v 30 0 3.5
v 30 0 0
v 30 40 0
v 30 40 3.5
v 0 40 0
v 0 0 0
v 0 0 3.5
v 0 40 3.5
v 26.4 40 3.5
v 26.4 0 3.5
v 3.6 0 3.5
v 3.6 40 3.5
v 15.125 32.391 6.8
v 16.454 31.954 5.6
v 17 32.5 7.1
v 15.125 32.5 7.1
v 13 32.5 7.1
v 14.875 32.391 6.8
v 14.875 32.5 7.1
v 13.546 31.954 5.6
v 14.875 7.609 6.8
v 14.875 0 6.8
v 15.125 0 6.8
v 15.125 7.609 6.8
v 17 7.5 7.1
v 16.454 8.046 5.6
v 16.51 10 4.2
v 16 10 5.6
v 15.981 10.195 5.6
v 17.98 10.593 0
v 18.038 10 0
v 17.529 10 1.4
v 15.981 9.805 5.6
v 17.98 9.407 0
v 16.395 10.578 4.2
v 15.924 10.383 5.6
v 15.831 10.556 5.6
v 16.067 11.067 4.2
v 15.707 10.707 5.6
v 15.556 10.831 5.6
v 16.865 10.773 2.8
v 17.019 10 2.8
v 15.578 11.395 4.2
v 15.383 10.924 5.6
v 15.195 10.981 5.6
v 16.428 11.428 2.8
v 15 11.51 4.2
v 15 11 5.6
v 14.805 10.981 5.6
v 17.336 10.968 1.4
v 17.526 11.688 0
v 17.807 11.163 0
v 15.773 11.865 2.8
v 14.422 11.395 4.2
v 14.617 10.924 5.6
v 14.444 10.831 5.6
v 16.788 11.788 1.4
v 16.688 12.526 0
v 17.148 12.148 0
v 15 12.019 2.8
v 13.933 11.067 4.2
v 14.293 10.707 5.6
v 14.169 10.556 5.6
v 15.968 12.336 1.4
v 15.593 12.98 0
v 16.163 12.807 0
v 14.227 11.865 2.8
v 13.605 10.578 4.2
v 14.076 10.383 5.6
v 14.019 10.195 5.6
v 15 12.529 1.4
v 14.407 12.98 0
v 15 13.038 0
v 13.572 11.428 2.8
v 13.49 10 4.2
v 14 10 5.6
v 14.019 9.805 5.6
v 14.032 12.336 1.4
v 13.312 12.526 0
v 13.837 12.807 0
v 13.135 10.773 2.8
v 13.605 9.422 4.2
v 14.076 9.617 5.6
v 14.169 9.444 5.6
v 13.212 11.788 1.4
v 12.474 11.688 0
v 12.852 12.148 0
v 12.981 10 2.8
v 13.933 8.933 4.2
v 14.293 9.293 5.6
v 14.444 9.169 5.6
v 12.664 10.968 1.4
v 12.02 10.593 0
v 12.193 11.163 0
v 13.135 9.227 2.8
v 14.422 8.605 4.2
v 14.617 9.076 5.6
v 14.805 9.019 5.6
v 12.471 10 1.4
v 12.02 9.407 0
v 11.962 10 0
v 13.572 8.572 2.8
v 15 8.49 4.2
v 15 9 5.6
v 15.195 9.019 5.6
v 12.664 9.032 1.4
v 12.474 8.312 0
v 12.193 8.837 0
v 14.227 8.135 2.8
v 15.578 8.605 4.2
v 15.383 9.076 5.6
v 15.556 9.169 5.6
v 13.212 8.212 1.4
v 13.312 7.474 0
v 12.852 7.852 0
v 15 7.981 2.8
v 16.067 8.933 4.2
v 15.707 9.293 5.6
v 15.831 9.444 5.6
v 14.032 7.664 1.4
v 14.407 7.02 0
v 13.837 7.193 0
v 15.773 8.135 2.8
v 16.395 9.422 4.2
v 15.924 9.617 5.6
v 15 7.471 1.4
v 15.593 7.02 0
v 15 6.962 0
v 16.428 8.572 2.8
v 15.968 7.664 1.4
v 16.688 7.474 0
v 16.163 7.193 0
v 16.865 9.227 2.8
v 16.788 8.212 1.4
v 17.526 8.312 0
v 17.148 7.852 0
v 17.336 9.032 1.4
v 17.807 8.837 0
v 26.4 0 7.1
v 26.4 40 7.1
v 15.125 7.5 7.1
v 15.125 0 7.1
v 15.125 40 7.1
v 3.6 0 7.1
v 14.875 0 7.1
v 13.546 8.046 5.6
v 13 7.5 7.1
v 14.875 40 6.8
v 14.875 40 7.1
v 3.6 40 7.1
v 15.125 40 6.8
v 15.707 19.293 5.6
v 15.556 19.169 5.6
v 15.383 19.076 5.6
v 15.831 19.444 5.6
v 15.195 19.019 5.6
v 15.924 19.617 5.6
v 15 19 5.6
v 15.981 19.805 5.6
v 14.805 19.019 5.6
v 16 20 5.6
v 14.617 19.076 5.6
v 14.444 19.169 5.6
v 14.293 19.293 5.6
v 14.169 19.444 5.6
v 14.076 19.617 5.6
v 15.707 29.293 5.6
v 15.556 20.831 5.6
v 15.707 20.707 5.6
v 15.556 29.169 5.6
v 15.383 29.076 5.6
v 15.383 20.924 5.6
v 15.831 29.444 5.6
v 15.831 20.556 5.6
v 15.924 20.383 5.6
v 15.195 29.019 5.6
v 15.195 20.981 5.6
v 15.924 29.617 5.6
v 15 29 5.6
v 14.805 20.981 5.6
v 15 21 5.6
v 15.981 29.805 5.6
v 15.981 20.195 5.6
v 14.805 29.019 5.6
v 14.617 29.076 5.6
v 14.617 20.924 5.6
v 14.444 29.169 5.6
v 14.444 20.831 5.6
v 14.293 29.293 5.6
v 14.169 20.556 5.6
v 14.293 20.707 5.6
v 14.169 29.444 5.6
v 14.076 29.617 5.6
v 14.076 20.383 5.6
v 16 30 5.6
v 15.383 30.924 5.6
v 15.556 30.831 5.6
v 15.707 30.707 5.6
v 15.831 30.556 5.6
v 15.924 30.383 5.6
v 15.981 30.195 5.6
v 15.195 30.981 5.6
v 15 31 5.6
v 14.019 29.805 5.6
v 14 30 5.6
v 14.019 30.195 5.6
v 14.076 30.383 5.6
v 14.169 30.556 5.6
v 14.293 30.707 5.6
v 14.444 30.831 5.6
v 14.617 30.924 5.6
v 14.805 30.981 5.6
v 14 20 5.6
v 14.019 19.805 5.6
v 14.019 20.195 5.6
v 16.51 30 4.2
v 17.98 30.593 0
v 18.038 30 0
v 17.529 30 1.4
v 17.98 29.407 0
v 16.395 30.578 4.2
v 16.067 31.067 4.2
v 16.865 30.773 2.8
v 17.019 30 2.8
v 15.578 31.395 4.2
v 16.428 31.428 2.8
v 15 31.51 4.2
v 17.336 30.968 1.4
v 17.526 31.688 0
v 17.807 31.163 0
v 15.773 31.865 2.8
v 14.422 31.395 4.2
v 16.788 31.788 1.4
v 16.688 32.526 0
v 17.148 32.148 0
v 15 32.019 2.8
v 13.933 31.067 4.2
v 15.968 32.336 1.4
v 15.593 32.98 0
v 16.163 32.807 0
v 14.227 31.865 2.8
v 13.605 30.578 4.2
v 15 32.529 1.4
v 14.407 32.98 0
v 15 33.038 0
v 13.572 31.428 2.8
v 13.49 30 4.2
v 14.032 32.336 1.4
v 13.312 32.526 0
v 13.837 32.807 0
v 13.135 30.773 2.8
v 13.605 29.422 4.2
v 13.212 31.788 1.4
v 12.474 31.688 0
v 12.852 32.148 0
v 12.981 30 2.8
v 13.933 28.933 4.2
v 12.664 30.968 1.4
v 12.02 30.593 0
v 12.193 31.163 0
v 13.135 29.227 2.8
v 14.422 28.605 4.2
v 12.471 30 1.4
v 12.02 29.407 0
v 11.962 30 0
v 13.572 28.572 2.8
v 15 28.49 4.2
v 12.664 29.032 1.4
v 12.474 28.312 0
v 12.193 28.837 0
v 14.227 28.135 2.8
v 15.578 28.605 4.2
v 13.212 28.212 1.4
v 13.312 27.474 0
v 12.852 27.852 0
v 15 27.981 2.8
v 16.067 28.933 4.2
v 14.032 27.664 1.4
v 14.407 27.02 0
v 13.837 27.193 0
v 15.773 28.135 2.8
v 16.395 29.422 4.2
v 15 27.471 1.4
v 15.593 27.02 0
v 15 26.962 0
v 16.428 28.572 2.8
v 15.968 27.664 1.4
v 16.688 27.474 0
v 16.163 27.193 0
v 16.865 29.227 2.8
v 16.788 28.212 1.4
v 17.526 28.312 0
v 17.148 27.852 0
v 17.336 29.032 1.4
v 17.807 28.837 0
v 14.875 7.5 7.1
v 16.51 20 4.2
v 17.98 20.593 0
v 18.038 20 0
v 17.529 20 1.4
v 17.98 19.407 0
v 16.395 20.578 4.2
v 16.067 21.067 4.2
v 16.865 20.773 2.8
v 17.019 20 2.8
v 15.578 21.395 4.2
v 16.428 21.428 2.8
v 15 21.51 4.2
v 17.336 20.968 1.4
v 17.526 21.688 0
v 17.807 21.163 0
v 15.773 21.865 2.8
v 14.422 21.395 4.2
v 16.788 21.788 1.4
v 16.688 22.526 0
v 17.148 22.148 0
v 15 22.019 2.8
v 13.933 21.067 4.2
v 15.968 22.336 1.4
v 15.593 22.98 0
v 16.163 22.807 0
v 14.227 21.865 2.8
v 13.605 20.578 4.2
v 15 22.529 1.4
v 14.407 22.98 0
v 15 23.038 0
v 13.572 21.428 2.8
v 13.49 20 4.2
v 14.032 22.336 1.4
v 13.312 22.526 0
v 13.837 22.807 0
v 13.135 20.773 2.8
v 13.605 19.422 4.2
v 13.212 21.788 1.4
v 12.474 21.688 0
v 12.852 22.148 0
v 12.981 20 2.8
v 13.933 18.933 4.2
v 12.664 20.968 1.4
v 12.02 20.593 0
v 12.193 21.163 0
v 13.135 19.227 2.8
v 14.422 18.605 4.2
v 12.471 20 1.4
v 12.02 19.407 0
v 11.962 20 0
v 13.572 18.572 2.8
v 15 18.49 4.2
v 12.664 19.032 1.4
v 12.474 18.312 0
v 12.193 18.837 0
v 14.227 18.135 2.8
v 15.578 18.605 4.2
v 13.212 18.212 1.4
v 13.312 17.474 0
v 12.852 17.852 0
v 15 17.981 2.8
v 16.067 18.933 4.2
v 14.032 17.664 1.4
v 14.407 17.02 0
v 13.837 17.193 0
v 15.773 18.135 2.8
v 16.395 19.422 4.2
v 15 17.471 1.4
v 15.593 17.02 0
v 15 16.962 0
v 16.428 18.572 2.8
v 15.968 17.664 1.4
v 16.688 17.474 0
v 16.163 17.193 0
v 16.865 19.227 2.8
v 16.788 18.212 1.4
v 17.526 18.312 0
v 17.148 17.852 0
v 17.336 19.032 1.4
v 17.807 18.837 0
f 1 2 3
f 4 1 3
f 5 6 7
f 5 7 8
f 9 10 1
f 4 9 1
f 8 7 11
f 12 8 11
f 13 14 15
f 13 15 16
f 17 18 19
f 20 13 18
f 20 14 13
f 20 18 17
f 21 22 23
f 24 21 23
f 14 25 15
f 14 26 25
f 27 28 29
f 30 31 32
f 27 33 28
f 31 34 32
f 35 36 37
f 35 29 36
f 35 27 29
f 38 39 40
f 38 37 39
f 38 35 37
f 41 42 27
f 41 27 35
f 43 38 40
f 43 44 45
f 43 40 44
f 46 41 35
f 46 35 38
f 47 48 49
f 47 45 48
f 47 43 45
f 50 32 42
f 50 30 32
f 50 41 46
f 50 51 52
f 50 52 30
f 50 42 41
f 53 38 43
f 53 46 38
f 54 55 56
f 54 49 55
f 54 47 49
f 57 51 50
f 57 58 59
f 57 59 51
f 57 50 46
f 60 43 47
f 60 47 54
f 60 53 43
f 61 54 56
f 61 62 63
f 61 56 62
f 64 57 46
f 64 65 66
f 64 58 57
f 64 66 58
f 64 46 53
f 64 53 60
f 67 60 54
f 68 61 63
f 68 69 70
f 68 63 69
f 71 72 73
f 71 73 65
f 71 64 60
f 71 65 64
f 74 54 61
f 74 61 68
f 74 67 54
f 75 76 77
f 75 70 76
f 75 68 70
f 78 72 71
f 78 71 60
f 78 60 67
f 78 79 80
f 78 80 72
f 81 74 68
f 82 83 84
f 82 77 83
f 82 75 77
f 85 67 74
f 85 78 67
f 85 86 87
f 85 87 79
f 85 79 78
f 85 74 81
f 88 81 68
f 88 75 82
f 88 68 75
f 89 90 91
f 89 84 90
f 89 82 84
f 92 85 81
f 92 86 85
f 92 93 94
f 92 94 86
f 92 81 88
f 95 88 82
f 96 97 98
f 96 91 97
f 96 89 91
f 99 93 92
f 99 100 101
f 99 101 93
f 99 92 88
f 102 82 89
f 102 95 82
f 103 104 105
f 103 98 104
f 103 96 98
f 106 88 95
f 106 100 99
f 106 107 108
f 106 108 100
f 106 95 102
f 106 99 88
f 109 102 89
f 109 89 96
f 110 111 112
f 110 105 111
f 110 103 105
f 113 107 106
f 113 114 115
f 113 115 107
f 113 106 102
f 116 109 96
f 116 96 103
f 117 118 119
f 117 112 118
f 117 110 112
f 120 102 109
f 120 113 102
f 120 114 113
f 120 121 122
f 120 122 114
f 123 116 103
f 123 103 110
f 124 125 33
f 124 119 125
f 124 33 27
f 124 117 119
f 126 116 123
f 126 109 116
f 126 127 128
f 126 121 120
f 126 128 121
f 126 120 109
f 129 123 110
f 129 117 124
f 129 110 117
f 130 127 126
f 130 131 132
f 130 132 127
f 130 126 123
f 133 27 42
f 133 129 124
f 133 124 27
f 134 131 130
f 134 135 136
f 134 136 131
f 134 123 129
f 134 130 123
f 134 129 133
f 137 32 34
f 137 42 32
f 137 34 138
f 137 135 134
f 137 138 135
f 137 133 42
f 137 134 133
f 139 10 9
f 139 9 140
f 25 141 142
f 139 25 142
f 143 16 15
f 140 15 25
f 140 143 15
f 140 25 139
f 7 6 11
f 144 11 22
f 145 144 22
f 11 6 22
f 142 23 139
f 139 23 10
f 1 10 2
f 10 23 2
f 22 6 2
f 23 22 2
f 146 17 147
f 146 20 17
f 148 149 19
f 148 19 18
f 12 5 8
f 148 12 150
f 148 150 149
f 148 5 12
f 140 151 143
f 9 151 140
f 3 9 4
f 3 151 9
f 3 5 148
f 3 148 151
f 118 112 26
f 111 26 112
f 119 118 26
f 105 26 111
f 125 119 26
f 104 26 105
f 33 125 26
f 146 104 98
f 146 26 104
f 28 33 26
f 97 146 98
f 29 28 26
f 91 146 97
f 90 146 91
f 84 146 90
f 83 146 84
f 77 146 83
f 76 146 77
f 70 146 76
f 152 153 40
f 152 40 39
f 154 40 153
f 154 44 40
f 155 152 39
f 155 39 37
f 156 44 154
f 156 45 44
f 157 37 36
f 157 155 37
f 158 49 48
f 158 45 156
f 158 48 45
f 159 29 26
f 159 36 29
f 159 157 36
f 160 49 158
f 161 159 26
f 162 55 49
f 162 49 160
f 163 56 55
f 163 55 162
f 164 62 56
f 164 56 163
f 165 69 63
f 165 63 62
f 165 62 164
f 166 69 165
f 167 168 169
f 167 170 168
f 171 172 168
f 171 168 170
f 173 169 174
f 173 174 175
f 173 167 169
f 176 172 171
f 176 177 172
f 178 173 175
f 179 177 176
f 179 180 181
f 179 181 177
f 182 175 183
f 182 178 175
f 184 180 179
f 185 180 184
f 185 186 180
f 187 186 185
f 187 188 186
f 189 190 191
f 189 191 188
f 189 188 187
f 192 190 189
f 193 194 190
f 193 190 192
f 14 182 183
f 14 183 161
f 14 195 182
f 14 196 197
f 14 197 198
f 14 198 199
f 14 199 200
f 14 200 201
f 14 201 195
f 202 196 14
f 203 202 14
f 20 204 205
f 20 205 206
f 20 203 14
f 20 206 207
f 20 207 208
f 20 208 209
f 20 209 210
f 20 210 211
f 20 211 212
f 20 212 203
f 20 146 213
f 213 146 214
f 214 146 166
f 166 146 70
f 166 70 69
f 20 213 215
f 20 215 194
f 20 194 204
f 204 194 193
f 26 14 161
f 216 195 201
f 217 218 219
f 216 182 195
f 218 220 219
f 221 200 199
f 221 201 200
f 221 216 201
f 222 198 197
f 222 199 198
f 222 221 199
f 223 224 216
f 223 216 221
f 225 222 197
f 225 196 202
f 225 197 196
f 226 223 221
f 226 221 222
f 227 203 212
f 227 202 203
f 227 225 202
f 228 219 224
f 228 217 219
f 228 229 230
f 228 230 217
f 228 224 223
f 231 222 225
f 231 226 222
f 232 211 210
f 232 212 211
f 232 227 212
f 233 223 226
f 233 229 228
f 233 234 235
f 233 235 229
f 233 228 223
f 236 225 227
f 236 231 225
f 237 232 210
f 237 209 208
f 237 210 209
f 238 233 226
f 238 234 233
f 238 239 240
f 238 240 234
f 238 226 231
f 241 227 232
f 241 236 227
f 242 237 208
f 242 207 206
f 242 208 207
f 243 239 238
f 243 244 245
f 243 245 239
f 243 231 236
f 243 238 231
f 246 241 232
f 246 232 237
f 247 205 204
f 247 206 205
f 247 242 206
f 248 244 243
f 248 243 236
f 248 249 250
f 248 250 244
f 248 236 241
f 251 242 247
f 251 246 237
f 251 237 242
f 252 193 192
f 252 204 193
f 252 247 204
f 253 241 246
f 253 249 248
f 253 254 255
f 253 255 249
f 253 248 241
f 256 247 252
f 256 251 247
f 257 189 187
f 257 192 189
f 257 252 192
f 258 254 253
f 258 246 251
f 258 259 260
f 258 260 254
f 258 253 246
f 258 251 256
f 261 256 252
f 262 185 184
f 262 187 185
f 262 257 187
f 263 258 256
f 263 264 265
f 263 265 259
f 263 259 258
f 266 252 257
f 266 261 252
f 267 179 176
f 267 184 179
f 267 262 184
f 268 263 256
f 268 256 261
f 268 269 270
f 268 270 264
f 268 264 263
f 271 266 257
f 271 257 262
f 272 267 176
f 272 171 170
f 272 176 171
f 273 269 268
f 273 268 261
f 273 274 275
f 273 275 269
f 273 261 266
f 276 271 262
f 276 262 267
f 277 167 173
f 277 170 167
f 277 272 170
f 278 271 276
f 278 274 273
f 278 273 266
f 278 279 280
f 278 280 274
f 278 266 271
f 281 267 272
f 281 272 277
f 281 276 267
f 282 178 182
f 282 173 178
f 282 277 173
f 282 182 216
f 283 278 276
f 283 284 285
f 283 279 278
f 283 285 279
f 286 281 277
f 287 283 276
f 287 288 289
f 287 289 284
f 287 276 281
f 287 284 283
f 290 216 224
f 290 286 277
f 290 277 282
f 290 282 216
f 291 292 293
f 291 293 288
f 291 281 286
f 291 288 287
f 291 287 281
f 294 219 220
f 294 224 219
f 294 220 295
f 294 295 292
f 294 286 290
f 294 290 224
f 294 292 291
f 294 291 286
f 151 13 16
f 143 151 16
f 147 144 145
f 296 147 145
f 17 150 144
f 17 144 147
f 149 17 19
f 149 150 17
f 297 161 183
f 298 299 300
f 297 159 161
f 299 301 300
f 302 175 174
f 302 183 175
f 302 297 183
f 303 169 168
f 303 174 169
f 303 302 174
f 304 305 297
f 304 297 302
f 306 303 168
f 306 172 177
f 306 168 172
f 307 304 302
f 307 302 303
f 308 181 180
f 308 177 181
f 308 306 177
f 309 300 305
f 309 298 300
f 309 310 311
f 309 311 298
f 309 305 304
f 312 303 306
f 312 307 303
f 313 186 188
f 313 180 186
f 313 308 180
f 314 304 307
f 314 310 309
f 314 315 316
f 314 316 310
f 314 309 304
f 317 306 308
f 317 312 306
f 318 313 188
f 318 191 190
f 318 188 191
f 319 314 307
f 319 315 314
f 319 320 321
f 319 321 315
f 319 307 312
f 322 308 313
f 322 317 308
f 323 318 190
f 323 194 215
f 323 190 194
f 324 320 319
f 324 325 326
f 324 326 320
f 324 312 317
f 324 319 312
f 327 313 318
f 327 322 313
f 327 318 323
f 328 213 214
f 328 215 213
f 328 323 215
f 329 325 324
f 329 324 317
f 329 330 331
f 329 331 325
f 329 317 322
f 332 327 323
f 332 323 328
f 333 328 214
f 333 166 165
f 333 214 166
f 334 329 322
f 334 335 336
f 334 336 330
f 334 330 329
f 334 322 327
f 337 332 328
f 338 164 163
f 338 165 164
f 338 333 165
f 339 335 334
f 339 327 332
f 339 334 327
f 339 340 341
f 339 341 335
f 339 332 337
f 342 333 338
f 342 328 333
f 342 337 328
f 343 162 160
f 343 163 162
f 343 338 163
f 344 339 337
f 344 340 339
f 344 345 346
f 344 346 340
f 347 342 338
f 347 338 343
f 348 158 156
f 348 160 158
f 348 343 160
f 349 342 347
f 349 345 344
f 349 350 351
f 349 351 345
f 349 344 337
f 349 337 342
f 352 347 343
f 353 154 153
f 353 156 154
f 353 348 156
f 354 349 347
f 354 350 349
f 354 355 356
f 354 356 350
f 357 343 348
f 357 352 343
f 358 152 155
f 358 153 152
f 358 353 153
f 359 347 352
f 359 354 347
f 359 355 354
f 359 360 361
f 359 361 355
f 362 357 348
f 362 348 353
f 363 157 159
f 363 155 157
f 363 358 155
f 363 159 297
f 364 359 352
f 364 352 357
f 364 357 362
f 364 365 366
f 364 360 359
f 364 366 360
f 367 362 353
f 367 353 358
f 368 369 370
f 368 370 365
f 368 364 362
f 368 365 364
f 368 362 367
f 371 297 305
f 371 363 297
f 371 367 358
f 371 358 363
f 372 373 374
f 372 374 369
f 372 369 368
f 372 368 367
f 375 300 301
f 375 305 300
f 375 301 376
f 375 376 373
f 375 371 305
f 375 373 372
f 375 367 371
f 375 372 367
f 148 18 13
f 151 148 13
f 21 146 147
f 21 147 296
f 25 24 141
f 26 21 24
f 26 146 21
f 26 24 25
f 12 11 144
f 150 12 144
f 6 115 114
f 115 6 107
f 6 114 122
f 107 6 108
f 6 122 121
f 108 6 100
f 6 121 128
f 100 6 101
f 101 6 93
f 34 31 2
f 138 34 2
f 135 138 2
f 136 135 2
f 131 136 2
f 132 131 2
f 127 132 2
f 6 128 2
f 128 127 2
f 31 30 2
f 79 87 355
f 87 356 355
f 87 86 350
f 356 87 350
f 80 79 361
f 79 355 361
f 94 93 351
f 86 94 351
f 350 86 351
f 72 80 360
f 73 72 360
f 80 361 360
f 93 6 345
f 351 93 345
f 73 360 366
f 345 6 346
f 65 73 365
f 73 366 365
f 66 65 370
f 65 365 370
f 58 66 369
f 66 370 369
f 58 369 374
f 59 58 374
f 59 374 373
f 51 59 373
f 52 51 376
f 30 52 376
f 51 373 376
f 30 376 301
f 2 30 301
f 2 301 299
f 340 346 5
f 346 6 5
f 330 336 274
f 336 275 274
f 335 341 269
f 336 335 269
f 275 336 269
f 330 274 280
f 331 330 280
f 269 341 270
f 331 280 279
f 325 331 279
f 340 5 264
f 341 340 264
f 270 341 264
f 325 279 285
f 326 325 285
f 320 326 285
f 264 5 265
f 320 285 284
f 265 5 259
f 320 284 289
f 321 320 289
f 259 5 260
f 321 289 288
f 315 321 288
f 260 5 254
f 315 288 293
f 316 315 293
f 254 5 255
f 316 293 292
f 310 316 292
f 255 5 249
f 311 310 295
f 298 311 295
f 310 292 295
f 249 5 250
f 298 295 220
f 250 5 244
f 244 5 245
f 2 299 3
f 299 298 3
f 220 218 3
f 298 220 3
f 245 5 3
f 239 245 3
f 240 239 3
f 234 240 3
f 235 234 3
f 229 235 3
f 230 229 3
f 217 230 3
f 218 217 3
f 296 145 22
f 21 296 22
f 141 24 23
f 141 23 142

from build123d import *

# Parameters (mm, degrees)
F0_W     = 30
F0_H     = 40
F1_DEPTH = 7.1
F2_W     = 4
F2_H     = 25
F3_DEPTH = 1.5
F3_TAPER = 20
F4_W     = 3.6
F4_H     = 3.6
F5_DEPTH = 40.001
F6_R     = 1
F7_DEPTH = 20
F7_TAPER = -20


with BuildPart() as f1:
    # F0 (on Top) → F1 (new body)
    with BuildSketch(Plane.XY):
        with Locations((15, 20)):
            Rectangle(F0_W, F0_H)
    extrude(amount=F1_DEPTH)

    # F2 (on face) → F3 (cut)
    with BuildSketch(Plane.XY.offset(7.1)):
        with Locations((15, 20)):
            Rectangle(F2_W, F2_H)
    extrude(amount=-F3_DEPTH, taper=F3_TAPER, mode=Mode.SUBTRACT)

    # F4 (on face) → F5 (cut, through all)
    with BuildSketch(Plane.XZ):
        with Locations((1.8, 5.3)):
            Rectangle(F4_W, F4_H)
        Polygon((15, 7.1), (14.875, 7.1), (14.875, 6.8), (15, 6.8), (15.125, 6.8), (15.125, 7.1), align=None)
        with Locations((28.2, 5.3)):
            Rectangle(F4_W, F4_H)
    extrude(amount=-F5_DEPTH, mode=Mode.SUBTRACT)

    # F6 (on face) → F7 (cut)
    with BuildSketch(Plane.XY.offset(5.6)):
        with Locations((15, 30)):
            Circle(F6_R)
        with Locations((15, 20)):
            Circle(F6_R)
        with Locations((15, 10)):
            Circle(F6_R)
    extrude(amount=-F7_DEPTH, taper=F7_TAPER, mode=Mode.SUBTRACT)


solid = f1.part
